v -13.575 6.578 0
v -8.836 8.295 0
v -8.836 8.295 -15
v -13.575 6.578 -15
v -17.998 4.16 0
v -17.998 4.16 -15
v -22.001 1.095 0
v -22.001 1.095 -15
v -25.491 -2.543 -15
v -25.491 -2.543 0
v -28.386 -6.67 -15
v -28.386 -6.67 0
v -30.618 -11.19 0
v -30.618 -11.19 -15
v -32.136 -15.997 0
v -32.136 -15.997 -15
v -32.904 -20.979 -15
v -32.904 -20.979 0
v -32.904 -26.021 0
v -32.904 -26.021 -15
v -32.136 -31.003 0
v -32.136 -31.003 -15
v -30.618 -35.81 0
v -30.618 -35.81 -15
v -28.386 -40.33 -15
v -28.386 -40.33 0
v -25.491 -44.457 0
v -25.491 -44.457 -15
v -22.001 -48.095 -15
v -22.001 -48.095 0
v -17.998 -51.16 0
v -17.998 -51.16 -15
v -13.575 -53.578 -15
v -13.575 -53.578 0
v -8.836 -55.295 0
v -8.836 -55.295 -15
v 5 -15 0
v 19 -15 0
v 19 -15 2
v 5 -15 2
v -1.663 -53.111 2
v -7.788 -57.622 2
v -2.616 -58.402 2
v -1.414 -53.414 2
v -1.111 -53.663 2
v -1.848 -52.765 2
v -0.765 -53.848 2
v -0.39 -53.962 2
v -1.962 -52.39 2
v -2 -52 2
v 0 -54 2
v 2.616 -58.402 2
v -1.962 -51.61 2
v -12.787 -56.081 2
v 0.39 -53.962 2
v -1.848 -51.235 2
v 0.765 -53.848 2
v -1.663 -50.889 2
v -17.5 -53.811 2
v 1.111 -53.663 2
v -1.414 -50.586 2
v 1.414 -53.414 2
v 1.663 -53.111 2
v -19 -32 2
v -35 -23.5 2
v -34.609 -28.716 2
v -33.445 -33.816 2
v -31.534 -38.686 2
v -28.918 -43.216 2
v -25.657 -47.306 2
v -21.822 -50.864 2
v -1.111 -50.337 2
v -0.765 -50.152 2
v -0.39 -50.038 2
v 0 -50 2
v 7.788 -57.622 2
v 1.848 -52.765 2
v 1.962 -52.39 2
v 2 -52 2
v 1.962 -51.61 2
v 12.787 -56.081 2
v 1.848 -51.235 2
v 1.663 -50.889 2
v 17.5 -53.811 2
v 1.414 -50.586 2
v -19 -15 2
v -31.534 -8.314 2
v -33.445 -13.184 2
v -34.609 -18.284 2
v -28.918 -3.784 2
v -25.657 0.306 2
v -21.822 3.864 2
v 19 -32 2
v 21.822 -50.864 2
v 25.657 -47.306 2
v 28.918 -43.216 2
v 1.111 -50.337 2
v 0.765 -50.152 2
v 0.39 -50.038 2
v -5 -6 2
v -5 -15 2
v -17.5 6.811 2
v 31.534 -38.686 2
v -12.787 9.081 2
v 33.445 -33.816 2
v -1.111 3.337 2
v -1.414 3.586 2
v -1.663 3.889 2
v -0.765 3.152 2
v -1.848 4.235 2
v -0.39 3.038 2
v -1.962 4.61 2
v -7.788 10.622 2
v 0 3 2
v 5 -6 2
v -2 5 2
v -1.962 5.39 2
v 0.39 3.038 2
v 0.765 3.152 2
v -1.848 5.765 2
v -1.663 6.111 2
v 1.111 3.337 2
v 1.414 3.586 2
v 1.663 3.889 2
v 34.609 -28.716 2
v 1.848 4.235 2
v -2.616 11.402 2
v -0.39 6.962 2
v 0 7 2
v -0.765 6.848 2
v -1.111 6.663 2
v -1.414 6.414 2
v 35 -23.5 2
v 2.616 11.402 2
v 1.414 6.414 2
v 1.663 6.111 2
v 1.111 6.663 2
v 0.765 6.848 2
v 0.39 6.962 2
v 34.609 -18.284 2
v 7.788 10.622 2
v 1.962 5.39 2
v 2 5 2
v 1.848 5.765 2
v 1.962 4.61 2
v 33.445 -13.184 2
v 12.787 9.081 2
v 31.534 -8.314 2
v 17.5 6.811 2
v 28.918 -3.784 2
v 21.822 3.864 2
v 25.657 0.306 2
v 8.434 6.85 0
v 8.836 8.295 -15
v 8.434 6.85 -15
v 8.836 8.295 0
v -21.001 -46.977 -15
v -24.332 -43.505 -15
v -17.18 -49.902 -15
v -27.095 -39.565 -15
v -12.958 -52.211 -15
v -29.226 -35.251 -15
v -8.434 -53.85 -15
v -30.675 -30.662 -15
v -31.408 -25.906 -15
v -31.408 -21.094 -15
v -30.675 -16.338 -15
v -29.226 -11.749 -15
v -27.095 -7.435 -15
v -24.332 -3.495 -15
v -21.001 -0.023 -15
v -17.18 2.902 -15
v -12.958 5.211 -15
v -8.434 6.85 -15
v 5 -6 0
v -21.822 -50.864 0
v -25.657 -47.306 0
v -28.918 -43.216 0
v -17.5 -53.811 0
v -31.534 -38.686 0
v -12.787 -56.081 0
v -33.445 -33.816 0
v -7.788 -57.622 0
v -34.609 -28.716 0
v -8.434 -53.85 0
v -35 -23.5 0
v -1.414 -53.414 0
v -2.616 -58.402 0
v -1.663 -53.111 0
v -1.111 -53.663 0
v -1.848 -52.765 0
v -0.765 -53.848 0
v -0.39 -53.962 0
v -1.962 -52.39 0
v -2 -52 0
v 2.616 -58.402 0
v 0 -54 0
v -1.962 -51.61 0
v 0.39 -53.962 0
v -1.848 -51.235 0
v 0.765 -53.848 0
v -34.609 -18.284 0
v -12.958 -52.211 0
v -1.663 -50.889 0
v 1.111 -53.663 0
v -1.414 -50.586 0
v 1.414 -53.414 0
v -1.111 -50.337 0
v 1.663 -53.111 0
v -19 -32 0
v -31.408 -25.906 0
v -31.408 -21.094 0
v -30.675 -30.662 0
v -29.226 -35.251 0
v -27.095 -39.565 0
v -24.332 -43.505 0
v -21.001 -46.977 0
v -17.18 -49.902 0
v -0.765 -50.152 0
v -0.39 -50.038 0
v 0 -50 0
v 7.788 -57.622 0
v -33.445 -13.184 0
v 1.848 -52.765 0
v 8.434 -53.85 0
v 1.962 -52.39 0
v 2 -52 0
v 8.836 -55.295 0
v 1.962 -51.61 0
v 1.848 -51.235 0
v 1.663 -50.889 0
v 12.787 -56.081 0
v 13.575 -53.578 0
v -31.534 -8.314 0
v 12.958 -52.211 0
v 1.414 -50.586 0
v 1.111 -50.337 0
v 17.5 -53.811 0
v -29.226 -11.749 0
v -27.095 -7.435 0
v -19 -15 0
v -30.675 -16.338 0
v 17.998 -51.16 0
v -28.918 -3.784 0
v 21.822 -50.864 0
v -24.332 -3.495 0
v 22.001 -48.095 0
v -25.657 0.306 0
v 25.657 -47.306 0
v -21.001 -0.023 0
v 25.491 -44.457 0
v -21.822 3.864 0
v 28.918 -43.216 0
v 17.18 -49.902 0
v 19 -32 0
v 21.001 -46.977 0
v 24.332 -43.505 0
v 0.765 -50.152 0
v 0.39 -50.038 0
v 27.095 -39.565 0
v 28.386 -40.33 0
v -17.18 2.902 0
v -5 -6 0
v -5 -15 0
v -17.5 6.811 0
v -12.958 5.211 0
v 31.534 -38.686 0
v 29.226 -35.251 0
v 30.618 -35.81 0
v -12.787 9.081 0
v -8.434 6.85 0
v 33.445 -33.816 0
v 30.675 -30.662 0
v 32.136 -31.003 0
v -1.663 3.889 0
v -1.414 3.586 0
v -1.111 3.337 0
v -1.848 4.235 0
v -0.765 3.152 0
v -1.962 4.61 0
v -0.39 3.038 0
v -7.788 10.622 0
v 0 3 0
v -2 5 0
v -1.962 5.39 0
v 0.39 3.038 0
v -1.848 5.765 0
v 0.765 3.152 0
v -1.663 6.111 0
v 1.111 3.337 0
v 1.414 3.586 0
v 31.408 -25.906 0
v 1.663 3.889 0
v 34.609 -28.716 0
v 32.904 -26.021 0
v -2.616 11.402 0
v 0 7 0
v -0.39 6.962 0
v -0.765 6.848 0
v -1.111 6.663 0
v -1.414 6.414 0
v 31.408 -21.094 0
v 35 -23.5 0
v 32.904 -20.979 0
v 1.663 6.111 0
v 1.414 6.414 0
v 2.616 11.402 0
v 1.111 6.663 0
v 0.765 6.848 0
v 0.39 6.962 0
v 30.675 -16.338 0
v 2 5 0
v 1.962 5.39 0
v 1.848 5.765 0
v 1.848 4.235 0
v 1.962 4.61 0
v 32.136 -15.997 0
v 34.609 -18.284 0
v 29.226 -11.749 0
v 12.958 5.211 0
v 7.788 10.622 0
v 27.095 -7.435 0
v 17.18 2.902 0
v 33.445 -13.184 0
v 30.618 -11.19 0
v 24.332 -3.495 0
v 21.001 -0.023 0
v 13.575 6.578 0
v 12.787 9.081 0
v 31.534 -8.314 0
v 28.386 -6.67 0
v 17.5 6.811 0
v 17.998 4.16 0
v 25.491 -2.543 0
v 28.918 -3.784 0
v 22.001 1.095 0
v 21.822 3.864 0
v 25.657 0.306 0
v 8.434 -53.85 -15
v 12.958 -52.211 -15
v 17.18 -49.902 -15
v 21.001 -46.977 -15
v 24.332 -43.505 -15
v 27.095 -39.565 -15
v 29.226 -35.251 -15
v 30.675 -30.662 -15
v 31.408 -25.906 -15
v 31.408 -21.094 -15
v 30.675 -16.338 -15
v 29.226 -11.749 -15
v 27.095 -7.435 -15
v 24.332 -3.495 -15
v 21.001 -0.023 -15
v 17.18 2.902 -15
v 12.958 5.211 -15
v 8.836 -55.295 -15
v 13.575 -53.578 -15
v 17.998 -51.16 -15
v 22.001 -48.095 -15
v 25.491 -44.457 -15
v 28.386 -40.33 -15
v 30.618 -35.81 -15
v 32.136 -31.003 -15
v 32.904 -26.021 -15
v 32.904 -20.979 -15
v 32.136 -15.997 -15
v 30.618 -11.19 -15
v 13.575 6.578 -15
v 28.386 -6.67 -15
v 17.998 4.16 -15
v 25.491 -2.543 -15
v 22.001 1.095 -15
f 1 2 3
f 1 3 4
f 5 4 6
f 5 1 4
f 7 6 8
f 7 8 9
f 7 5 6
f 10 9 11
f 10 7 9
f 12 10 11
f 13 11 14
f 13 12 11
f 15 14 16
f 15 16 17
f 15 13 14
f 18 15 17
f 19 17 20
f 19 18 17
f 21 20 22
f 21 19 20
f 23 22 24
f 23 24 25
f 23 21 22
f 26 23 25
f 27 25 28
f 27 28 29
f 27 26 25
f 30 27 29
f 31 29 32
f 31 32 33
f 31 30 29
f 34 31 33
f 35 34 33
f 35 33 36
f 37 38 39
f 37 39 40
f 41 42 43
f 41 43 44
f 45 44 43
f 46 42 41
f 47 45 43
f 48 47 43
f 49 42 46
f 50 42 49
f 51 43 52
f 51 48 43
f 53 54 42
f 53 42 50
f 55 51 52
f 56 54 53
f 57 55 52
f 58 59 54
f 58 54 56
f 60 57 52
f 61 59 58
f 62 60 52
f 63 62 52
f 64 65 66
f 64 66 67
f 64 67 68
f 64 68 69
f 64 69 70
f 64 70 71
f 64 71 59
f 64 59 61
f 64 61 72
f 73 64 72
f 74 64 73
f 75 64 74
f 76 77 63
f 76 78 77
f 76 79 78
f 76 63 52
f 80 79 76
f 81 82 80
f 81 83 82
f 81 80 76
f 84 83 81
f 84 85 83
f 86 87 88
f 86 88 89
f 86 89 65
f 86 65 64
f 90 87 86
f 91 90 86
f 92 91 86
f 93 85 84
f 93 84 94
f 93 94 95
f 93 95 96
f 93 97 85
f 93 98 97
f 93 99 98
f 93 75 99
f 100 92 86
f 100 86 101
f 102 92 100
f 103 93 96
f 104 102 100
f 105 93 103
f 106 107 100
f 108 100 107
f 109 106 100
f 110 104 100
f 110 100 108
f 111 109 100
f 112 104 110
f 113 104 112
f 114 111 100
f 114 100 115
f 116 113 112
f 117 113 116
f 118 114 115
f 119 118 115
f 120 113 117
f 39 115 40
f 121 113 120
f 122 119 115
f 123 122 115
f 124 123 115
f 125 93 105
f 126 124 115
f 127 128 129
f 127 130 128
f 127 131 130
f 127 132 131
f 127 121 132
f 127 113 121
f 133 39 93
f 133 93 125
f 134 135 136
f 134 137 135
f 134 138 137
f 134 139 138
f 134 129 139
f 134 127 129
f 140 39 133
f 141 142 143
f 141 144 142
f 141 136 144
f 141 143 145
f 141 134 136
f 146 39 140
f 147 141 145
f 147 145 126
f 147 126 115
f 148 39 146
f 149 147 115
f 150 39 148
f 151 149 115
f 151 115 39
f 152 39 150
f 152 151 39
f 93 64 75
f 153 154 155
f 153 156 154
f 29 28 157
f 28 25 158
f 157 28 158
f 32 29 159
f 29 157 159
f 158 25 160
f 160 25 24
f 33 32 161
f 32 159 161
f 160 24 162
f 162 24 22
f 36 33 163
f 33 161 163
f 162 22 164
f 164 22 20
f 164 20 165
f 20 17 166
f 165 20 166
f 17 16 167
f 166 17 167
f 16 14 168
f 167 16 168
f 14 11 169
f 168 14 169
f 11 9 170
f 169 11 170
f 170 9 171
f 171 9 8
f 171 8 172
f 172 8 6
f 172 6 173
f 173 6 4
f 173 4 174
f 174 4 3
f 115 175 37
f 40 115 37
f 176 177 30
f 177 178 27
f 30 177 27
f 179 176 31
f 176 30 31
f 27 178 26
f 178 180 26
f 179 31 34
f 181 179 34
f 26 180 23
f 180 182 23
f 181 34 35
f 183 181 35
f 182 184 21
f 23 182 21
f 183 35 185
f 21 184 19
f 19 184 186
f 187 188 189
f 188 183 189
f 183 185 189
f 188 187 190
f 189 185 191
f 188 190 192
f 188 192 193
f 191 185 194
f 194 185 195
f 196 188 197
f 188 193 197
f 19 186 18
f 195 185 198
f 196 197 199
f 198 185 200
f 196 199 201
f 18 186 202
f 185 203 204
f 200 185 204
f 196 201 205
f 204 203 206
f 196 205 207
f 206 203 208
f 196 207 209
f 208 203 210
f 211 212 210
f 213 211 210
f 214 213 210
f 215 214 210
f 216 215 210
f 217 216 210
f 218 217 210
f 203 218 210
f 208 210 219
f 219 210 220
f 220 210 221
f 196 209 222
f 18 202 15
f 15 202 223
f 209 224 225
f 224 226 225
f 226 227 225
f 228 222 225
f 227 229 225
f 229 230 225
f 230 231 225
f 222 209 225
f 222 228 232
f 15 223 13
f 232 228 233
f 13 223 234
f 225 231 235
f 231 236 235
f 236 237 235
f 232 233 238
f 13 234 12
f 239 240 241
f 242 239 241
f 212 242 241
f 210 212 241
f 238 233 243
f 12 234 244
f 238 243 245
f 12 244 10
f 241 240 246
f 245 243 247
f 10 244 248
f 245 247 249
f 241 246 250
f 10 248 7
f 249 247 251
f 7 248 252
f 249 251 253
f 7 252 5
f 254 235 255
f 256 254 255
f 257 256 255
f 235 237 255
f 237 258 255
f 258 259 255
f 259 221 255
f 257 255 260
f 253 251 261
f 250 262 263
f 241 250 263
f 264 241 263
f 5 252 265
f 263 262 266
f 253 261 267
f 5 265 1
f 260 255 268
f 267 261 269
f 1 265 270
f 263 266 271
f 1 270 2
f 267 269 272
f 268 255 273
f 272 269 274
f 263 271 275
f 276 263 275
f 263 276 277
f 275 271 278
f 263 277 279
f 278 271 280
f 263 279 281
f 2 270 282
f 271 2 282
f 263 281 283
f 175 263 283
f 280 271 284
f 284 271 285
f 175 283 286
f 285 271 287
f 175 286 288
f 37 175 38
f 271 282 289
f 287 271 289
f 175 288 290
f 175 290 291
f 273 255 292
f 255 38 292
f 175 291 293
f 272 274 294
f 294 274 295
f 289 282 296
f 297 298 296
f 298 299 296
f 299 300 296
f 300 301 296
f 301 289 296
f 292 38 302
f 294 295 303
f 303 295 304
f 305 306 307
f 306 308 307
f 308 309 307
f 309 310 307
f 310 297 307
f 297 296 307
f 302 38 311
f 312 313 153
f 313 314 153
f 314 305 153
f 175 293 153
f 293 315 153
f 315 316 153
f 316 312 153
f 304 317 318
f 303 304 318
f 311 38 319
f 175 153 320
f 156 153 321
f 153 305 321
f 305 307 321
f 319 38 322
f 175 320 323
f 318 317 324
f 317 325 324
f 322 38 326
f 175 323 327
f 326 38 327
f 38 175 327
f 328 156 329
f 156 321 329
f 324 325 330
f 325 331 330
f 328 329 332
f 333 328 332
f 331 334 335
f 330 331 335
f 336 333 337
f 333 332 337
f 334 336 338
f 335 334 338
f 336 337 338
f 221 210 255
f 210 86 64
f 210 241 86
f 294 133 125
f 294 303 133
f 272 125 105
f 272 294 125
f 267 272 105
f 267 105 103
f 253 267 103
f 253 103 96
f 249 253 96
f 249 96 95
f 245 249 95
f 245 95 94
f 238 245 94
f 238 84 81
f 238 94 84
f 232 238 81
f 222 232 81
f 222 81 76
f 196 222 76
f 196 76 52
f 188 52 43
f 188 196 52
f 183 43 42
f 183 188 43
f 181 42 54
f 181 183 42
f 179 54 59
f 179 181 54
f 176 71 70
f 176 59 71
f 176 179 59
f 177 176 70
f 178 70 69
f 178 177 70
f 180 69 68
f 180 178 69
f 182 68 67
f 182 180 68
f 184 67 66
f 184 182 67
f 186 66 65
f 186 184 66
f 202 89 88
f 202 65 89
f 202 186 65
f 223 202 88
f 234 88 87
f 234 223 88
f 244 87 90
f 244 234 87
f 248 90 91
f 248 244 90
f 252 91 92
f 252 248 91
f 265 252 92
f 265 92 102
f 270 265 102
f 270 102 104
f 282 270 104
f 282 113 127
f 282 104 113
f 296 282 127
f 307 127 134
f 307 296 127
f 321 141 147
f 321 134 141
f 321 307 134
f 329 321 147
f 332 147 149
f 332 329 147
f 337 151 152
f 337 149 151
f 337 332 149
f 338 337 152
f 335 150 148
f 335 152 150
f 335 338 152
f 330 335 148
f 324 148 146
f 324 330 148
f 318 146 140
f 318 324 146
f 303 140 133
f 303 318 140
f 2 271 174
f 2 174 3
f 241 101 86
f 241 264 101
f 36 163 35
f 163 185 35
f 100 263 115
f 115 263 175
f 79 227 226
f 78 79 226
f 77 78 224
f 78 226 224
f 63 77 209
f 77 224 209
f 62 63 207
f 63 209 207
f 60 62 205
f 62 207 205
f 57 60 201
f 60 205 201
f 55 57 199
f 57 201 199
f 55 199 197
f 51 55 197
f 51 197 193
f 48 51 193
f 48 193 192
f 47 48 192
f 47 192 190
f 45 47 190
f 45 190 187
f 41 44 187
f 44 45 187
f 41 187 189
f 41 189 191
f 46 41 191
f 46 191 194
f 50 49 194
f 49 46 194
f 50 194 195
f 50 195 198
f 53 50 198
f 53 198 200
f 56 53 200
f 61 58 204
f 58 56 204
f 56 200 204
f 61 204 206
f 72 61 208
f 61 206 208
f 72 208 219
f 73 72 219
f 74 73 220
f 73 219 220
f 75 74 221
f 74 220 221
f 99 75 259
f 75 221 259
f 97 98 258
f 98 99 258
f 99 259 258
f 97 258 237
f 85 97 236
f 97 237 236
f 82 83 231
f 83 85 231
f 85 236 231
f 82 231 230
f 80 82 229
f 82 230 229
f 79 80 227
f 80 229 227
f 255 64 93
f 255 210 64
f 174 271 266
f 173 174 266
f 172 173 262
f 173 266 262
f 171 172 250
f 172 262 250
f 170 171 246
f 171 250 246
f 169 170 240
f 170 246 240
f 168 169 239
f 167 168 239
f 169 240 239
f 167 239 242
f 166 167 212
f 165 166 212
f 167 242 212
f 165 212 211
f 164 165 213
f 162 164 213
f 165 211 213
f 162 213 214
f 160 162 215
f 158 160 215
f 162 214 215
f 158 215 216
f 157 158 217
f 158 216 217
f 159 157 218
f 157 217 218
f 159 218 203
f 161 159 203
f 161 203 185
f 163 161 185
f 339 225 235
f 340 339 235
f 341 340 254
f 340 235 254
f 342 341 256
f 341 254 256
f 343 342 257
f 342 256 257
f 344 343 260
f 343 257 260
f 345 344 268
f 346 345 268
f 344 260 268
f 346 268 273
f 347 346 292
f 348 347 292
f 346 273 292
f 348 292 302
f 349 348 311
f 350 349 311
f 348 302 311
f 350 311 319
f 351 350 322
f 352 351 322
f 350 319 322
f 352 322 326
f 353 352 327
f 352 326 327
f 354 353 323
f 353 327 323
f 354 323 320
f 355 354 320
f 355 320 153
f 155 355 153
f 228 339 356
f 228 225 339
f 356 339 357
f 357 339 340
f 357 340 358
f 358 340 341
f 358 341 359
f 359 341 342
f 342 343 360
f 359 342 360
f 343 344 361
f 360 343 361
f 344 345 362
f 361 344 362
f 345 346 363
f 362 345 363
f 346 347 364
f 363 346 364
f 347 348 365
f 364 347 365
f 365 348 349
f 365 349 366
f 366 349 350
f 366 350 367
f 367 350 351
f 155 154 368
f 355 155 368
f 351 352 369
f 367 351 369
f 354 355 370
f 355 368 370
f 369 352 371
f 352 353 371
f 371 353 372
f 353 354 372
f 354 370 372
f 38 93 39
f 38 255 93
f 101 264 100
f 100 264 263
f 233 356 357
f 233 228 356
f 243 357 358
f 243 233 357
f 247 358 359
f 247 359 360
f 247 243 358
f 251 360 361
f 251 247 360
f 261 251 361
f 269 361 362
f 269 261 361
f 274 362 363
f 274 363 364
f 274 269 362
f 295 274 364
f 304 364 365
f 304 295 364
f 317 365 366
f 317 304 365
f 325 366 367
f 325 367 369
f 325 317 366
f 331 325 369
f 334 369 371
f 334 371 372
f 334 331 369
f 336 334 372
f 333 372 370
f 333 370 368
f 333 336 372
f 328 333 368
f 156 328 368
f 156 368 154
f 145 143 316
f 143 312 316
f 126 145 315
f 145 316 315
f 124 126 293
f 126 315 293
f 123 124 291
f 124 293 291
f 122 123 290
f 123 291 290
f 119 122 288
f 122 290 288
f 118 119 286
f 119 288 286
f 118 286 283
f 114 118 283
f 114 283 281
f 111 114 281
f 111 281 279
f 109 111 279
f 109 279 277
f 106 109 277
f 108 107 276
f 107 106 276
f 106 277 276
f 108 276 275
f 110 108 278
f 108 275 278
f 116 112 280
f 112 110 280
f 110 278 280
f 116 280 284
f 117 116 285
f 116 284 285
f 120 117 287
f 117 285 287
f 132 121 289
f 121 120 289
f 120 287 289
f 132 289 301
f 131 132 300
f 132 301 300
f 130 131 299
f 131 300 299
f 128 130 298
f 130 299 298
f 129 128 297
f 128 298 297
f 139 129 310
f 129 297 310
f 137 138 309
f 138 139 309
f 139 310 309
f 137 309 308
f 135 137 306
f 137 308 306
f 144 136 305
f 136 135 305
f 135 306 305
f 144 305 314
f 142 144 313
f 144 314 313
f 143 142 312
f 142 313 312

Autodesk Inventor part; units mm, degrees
ref_plane "YZ Plane" through (0, 0, 0) normal (1, 0, 0) x (0, 1, 0)
ref_plane "XZ Plane" through (0, 0, 0) normal (0, 1, 0) x (-1, 0, 0)
sketch "Sketch1" plane through (0, 0, 0) normal (0, 0, 1) x (1, 0, 0)
  arc A0 (8.8357, -55.2951) -> (8.8357, 8.2951) centre (0, -23.5) ccw projected
  arc A1 (-8.8357, 8.2951) -> (-8.8357, -55.2951) centre (0, -23.5) ccw projected
  arc A2 (-8.4341, 6.8499) -> (-8.4341, -53.8499) centre (0, -23.5) ccw
  arc A3 (8.4341, -53.8499) -> (8.4341, 6.8499) centre (0, -23.5) ccw
  line L0 (-8.4341, 6.8499) -> (-8.8357, 8.2951)
  line L1 (-8.4341, -53.8499) -> (-8.8357, -55.2951)
  line L2 (8.4341, -53.8499) -> (8.8357, -55.2951)
  line L3 (8.8357, 8.2951) -> (8.4341, 6.8499)
  dimension "d36" = 1.5
  dimension "d37" = 1.5
extrude "Extrusion1" add sketch "Sketch1" against normal blind 15
ref_plane "Work Plane1" through (0, 0, 0) normal (0, 0, 1) x (1, 0, 0)
sketch "Sketch2" plane through (0, 0, 0) normal (0, 0, 1) x (1, 0, 0)
  circle A0 centre (0, -23.5) radius 35 projected
  circle A1 centre (0, 5) radius 1.5 projected
  circle A2 centre (0, -52) radius 1.5 projected
  circle A3 centre (0, 5) radius 2
  circle A4 centre (0, -52) radius 2
  line L0 (-25, -11) -> (25, -11)
  line L1 (25, -11) -> (25, -36)
  line L2 (25, -36) -> (-25, -36)
  line L3 (-25, -36) -> (-25, -11)
  line L4 (-25, -11) -> (25, -36) construction
  line L5 (25, -11) -> (-25, -36) construction
  line L6 (-19, -32) -> (19, -32)
  line L7 (19, -32) -> (19, -15)
  line L8 (19, -15) -> (-19, -15)
  line L9 (-19, -15) -> (-19, -32)
  line L10 (-19, -32) -> (19, -15) construction
  line L11 (19, -32) -> (-19, -15) construction
  line L12 (5, -18) -> (-5, -18)
  line L13 (-5, -18) -> (-5, -6)
  line L14 (-5, -6) -> (5, -6)
  line L15 (5, -6) -> (5, -18)
  line L16 (5, -18) -> (-5, -6) construction
  line L17 (-5, -18) -> (5, -6) construction
  point P0 (0, 0)
  point P1 (-5, -11)
  point P2 (0, -12)
  point P3 (5, -15)
  point P4 (-5, -15)
  dimension "d4" = 4
  dimension "d5" = 4
  dimension "d38" = 50
  dimension "d39" = 25
  dimension "d40" = 38
  dimension "d41" = 17
  dimension "d44" = 10
  dimension "d45" = 12
  dimension "d46" = 7
extrude "Extrusion2" add sketch "Sketch2" along normal blind 2 contours A0 | L0 L13 L8 L9 L6 L7 L15 L1 L2 L3
properties part number "lid2"
